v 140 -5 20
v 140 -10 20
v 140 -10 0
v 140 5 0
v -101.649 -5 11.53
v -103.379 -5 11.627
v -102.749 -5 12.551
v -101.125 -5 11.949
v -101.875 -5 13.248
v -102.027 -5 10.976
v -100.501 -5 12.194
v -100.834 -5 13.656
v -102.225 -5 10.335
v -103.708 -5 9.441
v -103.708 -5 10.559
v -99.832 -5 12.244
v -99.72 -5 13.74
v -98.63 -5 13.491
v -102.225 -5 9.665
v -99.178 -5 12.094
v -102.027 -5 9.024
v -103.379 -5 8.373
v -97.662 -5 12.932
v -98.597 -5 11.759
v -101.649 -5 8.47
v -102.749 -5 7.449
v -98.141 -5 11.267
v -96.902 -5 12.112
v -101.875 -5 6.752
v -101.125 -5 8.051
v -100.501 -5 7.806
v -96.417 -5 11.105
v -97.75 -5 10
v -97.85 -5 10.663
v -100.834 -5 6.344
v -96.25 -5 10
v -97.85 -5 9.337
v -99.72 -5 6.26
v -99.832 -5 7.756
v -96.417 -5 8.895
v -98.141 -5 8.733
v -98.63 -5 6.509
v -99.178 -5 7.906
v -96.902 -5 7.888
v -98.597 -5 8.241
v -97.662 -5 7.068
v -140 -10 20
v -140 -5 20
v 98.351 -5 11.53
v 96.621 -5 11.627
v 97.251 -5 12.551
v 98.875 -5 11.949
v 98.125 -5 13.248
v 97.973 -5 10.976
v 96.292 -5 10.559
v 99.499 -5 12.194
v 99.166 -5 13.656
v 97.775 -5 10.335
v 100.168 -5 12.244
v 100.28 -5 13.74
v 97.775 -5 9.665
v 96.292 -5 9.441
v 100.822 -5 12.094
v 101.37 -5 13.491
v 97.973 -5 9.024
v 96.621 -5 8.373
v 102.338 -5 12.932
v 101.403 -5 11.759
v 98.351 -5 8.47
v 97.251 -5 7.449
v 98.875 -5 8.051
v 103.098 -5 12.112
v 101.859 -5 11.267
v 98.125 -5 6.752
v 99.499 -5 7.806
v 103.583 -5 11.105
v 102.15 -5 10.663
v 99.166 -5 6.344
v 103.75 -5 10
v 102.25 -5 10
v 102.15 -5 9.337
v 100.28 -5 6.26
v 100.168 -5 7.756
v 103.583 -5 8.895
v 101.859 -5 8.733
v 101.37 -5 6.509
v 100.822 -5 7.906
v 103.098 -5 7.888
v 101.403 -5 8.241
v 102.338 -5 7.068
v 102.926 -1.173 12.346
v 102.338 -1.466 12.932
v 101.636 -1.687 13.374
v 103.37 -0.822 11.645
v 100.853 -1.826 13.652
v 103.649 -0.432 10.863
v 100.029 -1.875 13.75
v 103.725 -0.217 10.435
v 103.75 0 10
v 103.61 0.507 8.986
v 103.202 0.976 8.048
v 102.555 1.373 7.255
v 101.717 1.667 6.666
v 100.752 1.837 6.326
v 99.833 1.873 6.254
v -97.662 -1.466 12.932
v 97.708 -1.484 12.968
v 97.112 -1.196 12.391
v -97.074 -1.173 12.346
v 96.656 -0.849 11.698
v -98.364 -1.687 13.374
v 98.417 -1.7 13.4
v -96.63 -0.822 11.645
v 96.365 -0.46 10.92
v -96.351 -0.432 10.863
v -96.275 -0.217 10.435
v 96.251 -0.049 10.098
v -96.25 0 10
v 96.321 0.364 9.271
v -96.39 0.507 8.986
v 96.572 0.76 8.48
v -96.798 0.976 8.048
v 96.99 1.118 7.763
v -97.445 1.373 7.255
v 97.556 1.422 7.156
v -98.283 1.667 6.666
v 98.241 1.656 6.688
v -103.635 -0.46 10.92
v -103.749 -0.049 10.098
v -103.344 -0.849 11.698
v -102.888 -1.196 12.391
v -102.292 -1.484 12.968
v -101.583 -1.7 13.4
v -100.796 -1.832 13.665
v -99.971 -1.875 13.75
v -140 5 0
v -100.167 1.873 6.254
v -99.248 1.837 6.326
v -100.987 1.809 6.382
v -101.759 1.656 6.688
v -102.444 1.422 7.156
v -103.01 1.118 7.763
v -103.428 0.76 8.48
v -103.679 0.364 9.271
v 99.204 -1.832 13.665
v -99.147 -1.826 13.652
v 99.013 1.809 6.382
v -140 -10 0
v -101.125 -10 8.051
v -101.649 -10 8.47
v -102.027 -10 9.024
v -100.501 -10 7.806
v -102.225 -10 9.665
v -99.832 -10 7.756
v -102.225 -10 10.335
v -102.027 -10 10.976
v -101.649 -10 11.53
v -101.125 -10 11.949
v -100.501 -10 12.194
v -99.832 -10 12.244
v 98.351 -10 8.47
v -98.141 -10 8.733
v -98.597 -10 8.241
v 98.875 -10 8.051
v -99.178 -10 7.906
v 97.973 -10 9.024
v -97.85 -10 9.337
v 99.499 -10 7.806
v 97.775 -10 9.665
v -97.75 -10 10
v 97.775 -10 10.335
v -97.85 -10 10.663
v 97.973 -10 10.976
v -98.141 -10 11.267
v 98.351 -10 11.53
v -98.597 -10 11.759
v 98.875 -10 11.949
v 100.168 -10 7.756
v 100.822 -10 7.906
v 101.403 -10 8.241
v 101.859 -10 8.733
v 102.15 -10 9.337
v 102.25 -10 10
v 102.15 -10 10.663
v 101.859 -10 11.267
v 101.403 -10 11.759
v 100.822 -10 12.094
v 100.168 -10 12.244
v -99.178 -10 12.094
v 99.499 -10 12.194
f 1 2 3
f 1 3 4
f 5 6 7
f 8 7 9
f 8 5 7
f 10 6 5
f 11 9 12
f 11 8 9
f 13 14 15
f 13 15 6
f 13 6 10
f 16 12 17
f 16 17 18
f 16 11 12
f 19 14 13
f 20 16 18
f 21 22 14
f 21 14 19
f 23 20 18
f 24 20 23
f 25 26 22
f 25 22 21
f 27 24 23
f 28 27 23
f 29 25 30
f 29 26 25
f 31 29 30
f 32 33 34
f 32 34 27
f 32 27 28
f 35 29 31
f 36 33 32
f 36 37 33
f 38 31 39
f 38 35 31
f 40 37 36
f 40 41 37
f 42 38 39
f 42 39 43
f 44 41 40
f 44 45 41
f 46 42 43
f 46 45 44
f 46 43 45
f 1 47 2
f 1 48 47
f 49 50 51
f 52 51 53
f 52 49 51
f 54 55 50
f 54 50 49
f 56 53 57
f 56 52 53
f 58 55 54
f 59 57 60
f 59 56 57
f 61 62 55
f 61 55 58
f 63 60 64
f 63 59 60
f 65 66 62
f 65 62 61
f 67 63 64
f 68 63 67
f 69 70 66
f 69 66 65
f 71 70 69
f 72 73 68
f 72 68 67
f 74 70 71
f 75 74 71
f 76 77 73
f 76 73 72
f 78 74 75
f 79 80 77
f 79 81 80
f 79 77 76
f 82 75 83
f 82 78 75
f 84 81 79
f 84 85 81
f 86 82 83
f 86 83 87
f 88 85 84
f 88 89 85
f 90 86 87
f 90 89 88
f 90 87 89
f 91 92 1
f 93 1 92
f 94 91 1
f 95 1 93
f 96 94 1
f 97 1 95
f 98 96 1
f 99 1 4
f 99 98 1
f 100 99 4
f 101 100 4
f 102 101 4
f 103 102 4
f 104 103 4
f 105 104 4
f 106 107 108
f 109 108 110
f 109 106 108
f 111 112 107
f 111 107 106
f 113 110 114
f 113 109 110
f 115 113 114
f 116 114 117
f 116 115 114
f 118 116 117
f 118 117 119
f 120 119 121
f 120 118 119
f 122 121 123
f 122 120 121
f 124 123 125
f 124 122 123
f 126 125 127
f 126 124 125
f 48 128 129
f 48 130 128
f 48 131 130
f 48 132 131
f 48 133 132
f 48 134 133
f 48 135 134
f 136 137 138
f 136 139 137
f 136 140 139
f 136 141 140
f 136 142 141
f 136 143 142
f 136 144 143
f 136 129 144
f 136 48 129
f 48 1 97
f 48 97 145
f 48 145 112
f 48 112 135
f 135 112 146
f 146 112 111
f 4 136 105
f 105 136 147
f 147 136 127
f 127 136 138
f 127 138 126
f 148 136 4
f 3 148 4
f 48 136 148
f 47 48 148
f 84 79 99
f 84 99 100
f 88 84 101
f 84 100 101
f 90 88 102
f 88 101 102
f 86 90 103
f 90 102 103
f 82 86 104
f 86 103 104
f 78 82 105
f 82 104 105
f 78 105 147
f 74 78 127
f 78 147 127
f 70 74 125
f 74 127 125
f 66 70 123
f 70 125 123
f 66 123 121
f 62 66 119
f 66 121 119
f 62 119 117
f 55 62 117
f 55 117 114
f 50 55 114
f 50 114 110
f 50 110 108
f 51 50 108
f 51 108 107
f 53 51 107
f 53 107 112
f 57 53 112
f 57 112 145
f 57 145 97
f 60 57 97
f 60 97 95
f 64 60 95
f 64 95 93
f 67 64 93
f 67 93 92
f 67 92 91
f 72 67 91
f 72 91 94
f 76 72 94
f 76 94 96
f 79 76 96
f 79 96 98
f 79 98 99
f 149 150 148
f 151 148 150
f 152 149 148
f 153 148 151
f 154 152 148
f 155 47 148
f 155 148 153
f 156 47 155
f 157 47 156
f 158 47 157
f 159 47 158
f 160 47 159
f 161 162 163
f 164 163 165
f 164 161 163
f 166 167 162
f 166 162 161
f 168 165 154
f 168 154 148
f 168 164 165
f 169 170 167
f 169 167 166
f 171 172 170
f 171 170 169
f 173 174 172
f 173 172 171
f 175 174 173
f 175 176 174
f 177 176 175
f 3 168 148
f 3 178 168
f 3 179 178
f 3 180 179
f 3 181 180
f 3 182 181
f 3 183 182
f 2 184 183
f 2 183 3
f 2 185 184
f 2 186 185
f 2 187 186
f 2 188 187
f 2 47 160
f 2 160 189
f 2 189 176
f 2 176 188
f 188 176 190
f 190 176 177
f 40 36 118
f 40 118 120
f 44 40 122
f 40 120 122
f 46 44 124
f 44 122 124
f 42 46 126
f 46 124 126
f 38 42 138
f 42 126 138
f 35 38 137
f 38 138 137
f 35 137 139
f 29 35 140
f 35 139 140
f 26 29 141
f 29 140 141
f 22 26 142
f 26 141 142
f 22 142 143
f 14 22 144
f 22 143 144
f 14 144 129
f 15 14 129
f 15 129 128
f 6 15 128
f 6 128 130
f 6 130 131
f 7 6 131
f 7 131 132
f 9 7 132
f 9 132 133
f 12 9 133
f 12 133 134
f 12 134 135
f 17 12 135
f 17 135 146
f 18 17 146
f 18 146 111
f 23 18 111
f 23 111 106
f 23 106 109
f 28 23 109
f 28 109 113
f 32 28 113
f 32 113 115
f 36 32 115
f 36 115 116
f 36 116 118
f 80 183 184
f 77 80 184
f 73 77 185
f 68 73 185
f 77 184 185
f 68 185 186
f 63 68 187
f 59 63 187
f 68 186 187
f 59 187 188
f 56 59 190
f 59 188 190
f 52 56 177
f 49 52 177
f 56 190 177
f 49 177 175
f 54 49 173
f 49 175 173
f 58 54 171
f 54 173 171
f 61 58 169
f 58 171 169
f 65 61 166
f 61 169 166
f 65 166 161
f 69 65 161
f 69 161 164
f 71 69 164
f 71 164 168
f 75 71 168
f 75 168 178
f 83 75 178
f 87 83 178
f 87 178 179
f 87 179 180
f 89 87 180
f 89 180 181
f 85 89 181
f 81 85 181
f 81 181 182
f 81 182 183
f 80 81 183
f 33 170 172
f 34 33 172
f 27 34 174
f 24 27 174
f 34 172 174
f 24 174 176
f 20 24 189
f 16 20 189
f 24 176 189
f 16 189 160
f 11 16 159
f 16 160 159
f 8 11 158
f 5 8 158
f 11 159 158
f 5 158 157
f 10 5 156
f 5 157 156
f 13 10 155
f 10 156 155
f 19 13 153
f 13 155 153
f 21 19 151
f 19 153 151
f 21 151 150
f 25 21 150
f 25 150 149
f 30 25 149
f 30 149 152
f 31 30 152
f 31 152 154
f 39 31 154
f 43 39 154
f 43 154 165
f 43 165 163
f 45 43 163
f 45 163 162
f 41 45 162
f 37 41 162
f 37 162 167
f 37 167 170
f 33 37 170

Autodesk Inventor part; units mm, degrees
ref_plane "YZ Plane" through (0, 0, 0) normal (1, 0, 0) x (0, 1, 0)
ref_plane "XZ Plane" through (0, 0, 0) normal (0, 1, 0) x (-1, 0, 0)
ref_plane "XY Plane" through (0, 0, 0) normal (0, 0, 1) x (1, 0, 0)
sketch "Sketch1" plane through (0, 0, 0) normal (0, 0, 1) x (1, 0, 0)
  line L0 (140, 5) -> (-140, 5)
  line L1 (-140, 5) -> (-140, -5)
  line L2 (-140, -5) -> (140, -5)
  line L3 (140, -5) -> (140, 5)
  line L4 (140, 5) -> (-140, -5) construction
  line L5 (-140, 5) -> (140, -5) construction
  point P0 (0, 0)
  dimension "d0" = 280
  dimension "d1" = 10
extrude "Extrusion1" add sketch "Sketch1" along normal blind 20
sketch "Sketch6" plane through (-140, -5, 0) normal (0, -1, 0) x (1, 0, 0)
  line L0 (0, 0) -> (0, 20) projected
  line L1 (0, 0) -> (280, 0) projected
  line L2 (0, 20) -> (280, 20)
  line L3 (280, 20) -> (280, 0)
  line L4 (280, 0) -> (0, 0)
  line L5 (0, 0) -> (0, 20)
  point P0 (140, 0)
extrude "Extrusion4" add sketch "Sketch6" along normal blind 5
sketch "Sketch7" plane through (-140, -10, 0) normal (0, -1, 0) x (1, 0, 0)
  point P0 (140, 0)
sketch "Sketch8" plane through (-140, -10, 0) normal (0, -1, 0) x (1, 0, 0)
  circle A0 centre (40, 10) radius 2.1 projected
  circle A1 centre (40, 10) radius 2.25
  circle A2 centre (240, 10) radius 2.25
  line L0 (280, 20) -> (0, 20) projected
  line L1 (0, 20) -> (0, 0) projected
  point P0 (140, 0)
  dimension "d23" = 4.5
  dimension "d24" = 4.5
  dimension "d35" = 200
  dimension "d36" = 10
  dimension "d37" = 10
  dimension "d38" = 40
extrude "Extrusion5" cut sketch "Sketch8" against normal through all contours A0 | A1 | A2
sketch "Sketch9" plane through (-140, 5, 0) normal (0, 1, 0) x (1, 0, 0)
  circle A0 centre (40, -10) radius 2.25 projected
  circle A1 centre (40, -10) radius 3.75
  circle A2 centre (240, -10) radius 2.25 projected
  circle A3 centre (240, -10) radius 3.75
  point P0 (140, 0)
  dimension "d27" = 7.5
  dimension "d28" = 7.5
extrude "Extrusion6" cut sketch "Sketch9" against normal blind 10 contours A0 | A1 | A2 | A3
sketch "Sketch10" plane through (-140, 5, 0) normal (-1, 0, 0) x (0, 0, 1)
  line L0 (0, 0) -> (20, 0) projected
  line L1 (20, 0) -> (20, -10)
  line L2 (20, 0) -> (20, -15) projected
  line L3 (20, 0) -> (30, 0) construction
  line L4 (0, 0) -> (0, -15) projected
  line L5 (20, -10) -> (0, 0)
  line L6 (0, 0) -> (20, 0)
  point P0 (0, -5)
  dimension "d31" = 10
  dimension "d32" = 90
extrude "Extrusion7" cut sketch "Sketch10" against normal through all
equation "\"d24\" = d23"
equation "\"d28\" = d27"
properties part number "paw shelf_v03_temp"
